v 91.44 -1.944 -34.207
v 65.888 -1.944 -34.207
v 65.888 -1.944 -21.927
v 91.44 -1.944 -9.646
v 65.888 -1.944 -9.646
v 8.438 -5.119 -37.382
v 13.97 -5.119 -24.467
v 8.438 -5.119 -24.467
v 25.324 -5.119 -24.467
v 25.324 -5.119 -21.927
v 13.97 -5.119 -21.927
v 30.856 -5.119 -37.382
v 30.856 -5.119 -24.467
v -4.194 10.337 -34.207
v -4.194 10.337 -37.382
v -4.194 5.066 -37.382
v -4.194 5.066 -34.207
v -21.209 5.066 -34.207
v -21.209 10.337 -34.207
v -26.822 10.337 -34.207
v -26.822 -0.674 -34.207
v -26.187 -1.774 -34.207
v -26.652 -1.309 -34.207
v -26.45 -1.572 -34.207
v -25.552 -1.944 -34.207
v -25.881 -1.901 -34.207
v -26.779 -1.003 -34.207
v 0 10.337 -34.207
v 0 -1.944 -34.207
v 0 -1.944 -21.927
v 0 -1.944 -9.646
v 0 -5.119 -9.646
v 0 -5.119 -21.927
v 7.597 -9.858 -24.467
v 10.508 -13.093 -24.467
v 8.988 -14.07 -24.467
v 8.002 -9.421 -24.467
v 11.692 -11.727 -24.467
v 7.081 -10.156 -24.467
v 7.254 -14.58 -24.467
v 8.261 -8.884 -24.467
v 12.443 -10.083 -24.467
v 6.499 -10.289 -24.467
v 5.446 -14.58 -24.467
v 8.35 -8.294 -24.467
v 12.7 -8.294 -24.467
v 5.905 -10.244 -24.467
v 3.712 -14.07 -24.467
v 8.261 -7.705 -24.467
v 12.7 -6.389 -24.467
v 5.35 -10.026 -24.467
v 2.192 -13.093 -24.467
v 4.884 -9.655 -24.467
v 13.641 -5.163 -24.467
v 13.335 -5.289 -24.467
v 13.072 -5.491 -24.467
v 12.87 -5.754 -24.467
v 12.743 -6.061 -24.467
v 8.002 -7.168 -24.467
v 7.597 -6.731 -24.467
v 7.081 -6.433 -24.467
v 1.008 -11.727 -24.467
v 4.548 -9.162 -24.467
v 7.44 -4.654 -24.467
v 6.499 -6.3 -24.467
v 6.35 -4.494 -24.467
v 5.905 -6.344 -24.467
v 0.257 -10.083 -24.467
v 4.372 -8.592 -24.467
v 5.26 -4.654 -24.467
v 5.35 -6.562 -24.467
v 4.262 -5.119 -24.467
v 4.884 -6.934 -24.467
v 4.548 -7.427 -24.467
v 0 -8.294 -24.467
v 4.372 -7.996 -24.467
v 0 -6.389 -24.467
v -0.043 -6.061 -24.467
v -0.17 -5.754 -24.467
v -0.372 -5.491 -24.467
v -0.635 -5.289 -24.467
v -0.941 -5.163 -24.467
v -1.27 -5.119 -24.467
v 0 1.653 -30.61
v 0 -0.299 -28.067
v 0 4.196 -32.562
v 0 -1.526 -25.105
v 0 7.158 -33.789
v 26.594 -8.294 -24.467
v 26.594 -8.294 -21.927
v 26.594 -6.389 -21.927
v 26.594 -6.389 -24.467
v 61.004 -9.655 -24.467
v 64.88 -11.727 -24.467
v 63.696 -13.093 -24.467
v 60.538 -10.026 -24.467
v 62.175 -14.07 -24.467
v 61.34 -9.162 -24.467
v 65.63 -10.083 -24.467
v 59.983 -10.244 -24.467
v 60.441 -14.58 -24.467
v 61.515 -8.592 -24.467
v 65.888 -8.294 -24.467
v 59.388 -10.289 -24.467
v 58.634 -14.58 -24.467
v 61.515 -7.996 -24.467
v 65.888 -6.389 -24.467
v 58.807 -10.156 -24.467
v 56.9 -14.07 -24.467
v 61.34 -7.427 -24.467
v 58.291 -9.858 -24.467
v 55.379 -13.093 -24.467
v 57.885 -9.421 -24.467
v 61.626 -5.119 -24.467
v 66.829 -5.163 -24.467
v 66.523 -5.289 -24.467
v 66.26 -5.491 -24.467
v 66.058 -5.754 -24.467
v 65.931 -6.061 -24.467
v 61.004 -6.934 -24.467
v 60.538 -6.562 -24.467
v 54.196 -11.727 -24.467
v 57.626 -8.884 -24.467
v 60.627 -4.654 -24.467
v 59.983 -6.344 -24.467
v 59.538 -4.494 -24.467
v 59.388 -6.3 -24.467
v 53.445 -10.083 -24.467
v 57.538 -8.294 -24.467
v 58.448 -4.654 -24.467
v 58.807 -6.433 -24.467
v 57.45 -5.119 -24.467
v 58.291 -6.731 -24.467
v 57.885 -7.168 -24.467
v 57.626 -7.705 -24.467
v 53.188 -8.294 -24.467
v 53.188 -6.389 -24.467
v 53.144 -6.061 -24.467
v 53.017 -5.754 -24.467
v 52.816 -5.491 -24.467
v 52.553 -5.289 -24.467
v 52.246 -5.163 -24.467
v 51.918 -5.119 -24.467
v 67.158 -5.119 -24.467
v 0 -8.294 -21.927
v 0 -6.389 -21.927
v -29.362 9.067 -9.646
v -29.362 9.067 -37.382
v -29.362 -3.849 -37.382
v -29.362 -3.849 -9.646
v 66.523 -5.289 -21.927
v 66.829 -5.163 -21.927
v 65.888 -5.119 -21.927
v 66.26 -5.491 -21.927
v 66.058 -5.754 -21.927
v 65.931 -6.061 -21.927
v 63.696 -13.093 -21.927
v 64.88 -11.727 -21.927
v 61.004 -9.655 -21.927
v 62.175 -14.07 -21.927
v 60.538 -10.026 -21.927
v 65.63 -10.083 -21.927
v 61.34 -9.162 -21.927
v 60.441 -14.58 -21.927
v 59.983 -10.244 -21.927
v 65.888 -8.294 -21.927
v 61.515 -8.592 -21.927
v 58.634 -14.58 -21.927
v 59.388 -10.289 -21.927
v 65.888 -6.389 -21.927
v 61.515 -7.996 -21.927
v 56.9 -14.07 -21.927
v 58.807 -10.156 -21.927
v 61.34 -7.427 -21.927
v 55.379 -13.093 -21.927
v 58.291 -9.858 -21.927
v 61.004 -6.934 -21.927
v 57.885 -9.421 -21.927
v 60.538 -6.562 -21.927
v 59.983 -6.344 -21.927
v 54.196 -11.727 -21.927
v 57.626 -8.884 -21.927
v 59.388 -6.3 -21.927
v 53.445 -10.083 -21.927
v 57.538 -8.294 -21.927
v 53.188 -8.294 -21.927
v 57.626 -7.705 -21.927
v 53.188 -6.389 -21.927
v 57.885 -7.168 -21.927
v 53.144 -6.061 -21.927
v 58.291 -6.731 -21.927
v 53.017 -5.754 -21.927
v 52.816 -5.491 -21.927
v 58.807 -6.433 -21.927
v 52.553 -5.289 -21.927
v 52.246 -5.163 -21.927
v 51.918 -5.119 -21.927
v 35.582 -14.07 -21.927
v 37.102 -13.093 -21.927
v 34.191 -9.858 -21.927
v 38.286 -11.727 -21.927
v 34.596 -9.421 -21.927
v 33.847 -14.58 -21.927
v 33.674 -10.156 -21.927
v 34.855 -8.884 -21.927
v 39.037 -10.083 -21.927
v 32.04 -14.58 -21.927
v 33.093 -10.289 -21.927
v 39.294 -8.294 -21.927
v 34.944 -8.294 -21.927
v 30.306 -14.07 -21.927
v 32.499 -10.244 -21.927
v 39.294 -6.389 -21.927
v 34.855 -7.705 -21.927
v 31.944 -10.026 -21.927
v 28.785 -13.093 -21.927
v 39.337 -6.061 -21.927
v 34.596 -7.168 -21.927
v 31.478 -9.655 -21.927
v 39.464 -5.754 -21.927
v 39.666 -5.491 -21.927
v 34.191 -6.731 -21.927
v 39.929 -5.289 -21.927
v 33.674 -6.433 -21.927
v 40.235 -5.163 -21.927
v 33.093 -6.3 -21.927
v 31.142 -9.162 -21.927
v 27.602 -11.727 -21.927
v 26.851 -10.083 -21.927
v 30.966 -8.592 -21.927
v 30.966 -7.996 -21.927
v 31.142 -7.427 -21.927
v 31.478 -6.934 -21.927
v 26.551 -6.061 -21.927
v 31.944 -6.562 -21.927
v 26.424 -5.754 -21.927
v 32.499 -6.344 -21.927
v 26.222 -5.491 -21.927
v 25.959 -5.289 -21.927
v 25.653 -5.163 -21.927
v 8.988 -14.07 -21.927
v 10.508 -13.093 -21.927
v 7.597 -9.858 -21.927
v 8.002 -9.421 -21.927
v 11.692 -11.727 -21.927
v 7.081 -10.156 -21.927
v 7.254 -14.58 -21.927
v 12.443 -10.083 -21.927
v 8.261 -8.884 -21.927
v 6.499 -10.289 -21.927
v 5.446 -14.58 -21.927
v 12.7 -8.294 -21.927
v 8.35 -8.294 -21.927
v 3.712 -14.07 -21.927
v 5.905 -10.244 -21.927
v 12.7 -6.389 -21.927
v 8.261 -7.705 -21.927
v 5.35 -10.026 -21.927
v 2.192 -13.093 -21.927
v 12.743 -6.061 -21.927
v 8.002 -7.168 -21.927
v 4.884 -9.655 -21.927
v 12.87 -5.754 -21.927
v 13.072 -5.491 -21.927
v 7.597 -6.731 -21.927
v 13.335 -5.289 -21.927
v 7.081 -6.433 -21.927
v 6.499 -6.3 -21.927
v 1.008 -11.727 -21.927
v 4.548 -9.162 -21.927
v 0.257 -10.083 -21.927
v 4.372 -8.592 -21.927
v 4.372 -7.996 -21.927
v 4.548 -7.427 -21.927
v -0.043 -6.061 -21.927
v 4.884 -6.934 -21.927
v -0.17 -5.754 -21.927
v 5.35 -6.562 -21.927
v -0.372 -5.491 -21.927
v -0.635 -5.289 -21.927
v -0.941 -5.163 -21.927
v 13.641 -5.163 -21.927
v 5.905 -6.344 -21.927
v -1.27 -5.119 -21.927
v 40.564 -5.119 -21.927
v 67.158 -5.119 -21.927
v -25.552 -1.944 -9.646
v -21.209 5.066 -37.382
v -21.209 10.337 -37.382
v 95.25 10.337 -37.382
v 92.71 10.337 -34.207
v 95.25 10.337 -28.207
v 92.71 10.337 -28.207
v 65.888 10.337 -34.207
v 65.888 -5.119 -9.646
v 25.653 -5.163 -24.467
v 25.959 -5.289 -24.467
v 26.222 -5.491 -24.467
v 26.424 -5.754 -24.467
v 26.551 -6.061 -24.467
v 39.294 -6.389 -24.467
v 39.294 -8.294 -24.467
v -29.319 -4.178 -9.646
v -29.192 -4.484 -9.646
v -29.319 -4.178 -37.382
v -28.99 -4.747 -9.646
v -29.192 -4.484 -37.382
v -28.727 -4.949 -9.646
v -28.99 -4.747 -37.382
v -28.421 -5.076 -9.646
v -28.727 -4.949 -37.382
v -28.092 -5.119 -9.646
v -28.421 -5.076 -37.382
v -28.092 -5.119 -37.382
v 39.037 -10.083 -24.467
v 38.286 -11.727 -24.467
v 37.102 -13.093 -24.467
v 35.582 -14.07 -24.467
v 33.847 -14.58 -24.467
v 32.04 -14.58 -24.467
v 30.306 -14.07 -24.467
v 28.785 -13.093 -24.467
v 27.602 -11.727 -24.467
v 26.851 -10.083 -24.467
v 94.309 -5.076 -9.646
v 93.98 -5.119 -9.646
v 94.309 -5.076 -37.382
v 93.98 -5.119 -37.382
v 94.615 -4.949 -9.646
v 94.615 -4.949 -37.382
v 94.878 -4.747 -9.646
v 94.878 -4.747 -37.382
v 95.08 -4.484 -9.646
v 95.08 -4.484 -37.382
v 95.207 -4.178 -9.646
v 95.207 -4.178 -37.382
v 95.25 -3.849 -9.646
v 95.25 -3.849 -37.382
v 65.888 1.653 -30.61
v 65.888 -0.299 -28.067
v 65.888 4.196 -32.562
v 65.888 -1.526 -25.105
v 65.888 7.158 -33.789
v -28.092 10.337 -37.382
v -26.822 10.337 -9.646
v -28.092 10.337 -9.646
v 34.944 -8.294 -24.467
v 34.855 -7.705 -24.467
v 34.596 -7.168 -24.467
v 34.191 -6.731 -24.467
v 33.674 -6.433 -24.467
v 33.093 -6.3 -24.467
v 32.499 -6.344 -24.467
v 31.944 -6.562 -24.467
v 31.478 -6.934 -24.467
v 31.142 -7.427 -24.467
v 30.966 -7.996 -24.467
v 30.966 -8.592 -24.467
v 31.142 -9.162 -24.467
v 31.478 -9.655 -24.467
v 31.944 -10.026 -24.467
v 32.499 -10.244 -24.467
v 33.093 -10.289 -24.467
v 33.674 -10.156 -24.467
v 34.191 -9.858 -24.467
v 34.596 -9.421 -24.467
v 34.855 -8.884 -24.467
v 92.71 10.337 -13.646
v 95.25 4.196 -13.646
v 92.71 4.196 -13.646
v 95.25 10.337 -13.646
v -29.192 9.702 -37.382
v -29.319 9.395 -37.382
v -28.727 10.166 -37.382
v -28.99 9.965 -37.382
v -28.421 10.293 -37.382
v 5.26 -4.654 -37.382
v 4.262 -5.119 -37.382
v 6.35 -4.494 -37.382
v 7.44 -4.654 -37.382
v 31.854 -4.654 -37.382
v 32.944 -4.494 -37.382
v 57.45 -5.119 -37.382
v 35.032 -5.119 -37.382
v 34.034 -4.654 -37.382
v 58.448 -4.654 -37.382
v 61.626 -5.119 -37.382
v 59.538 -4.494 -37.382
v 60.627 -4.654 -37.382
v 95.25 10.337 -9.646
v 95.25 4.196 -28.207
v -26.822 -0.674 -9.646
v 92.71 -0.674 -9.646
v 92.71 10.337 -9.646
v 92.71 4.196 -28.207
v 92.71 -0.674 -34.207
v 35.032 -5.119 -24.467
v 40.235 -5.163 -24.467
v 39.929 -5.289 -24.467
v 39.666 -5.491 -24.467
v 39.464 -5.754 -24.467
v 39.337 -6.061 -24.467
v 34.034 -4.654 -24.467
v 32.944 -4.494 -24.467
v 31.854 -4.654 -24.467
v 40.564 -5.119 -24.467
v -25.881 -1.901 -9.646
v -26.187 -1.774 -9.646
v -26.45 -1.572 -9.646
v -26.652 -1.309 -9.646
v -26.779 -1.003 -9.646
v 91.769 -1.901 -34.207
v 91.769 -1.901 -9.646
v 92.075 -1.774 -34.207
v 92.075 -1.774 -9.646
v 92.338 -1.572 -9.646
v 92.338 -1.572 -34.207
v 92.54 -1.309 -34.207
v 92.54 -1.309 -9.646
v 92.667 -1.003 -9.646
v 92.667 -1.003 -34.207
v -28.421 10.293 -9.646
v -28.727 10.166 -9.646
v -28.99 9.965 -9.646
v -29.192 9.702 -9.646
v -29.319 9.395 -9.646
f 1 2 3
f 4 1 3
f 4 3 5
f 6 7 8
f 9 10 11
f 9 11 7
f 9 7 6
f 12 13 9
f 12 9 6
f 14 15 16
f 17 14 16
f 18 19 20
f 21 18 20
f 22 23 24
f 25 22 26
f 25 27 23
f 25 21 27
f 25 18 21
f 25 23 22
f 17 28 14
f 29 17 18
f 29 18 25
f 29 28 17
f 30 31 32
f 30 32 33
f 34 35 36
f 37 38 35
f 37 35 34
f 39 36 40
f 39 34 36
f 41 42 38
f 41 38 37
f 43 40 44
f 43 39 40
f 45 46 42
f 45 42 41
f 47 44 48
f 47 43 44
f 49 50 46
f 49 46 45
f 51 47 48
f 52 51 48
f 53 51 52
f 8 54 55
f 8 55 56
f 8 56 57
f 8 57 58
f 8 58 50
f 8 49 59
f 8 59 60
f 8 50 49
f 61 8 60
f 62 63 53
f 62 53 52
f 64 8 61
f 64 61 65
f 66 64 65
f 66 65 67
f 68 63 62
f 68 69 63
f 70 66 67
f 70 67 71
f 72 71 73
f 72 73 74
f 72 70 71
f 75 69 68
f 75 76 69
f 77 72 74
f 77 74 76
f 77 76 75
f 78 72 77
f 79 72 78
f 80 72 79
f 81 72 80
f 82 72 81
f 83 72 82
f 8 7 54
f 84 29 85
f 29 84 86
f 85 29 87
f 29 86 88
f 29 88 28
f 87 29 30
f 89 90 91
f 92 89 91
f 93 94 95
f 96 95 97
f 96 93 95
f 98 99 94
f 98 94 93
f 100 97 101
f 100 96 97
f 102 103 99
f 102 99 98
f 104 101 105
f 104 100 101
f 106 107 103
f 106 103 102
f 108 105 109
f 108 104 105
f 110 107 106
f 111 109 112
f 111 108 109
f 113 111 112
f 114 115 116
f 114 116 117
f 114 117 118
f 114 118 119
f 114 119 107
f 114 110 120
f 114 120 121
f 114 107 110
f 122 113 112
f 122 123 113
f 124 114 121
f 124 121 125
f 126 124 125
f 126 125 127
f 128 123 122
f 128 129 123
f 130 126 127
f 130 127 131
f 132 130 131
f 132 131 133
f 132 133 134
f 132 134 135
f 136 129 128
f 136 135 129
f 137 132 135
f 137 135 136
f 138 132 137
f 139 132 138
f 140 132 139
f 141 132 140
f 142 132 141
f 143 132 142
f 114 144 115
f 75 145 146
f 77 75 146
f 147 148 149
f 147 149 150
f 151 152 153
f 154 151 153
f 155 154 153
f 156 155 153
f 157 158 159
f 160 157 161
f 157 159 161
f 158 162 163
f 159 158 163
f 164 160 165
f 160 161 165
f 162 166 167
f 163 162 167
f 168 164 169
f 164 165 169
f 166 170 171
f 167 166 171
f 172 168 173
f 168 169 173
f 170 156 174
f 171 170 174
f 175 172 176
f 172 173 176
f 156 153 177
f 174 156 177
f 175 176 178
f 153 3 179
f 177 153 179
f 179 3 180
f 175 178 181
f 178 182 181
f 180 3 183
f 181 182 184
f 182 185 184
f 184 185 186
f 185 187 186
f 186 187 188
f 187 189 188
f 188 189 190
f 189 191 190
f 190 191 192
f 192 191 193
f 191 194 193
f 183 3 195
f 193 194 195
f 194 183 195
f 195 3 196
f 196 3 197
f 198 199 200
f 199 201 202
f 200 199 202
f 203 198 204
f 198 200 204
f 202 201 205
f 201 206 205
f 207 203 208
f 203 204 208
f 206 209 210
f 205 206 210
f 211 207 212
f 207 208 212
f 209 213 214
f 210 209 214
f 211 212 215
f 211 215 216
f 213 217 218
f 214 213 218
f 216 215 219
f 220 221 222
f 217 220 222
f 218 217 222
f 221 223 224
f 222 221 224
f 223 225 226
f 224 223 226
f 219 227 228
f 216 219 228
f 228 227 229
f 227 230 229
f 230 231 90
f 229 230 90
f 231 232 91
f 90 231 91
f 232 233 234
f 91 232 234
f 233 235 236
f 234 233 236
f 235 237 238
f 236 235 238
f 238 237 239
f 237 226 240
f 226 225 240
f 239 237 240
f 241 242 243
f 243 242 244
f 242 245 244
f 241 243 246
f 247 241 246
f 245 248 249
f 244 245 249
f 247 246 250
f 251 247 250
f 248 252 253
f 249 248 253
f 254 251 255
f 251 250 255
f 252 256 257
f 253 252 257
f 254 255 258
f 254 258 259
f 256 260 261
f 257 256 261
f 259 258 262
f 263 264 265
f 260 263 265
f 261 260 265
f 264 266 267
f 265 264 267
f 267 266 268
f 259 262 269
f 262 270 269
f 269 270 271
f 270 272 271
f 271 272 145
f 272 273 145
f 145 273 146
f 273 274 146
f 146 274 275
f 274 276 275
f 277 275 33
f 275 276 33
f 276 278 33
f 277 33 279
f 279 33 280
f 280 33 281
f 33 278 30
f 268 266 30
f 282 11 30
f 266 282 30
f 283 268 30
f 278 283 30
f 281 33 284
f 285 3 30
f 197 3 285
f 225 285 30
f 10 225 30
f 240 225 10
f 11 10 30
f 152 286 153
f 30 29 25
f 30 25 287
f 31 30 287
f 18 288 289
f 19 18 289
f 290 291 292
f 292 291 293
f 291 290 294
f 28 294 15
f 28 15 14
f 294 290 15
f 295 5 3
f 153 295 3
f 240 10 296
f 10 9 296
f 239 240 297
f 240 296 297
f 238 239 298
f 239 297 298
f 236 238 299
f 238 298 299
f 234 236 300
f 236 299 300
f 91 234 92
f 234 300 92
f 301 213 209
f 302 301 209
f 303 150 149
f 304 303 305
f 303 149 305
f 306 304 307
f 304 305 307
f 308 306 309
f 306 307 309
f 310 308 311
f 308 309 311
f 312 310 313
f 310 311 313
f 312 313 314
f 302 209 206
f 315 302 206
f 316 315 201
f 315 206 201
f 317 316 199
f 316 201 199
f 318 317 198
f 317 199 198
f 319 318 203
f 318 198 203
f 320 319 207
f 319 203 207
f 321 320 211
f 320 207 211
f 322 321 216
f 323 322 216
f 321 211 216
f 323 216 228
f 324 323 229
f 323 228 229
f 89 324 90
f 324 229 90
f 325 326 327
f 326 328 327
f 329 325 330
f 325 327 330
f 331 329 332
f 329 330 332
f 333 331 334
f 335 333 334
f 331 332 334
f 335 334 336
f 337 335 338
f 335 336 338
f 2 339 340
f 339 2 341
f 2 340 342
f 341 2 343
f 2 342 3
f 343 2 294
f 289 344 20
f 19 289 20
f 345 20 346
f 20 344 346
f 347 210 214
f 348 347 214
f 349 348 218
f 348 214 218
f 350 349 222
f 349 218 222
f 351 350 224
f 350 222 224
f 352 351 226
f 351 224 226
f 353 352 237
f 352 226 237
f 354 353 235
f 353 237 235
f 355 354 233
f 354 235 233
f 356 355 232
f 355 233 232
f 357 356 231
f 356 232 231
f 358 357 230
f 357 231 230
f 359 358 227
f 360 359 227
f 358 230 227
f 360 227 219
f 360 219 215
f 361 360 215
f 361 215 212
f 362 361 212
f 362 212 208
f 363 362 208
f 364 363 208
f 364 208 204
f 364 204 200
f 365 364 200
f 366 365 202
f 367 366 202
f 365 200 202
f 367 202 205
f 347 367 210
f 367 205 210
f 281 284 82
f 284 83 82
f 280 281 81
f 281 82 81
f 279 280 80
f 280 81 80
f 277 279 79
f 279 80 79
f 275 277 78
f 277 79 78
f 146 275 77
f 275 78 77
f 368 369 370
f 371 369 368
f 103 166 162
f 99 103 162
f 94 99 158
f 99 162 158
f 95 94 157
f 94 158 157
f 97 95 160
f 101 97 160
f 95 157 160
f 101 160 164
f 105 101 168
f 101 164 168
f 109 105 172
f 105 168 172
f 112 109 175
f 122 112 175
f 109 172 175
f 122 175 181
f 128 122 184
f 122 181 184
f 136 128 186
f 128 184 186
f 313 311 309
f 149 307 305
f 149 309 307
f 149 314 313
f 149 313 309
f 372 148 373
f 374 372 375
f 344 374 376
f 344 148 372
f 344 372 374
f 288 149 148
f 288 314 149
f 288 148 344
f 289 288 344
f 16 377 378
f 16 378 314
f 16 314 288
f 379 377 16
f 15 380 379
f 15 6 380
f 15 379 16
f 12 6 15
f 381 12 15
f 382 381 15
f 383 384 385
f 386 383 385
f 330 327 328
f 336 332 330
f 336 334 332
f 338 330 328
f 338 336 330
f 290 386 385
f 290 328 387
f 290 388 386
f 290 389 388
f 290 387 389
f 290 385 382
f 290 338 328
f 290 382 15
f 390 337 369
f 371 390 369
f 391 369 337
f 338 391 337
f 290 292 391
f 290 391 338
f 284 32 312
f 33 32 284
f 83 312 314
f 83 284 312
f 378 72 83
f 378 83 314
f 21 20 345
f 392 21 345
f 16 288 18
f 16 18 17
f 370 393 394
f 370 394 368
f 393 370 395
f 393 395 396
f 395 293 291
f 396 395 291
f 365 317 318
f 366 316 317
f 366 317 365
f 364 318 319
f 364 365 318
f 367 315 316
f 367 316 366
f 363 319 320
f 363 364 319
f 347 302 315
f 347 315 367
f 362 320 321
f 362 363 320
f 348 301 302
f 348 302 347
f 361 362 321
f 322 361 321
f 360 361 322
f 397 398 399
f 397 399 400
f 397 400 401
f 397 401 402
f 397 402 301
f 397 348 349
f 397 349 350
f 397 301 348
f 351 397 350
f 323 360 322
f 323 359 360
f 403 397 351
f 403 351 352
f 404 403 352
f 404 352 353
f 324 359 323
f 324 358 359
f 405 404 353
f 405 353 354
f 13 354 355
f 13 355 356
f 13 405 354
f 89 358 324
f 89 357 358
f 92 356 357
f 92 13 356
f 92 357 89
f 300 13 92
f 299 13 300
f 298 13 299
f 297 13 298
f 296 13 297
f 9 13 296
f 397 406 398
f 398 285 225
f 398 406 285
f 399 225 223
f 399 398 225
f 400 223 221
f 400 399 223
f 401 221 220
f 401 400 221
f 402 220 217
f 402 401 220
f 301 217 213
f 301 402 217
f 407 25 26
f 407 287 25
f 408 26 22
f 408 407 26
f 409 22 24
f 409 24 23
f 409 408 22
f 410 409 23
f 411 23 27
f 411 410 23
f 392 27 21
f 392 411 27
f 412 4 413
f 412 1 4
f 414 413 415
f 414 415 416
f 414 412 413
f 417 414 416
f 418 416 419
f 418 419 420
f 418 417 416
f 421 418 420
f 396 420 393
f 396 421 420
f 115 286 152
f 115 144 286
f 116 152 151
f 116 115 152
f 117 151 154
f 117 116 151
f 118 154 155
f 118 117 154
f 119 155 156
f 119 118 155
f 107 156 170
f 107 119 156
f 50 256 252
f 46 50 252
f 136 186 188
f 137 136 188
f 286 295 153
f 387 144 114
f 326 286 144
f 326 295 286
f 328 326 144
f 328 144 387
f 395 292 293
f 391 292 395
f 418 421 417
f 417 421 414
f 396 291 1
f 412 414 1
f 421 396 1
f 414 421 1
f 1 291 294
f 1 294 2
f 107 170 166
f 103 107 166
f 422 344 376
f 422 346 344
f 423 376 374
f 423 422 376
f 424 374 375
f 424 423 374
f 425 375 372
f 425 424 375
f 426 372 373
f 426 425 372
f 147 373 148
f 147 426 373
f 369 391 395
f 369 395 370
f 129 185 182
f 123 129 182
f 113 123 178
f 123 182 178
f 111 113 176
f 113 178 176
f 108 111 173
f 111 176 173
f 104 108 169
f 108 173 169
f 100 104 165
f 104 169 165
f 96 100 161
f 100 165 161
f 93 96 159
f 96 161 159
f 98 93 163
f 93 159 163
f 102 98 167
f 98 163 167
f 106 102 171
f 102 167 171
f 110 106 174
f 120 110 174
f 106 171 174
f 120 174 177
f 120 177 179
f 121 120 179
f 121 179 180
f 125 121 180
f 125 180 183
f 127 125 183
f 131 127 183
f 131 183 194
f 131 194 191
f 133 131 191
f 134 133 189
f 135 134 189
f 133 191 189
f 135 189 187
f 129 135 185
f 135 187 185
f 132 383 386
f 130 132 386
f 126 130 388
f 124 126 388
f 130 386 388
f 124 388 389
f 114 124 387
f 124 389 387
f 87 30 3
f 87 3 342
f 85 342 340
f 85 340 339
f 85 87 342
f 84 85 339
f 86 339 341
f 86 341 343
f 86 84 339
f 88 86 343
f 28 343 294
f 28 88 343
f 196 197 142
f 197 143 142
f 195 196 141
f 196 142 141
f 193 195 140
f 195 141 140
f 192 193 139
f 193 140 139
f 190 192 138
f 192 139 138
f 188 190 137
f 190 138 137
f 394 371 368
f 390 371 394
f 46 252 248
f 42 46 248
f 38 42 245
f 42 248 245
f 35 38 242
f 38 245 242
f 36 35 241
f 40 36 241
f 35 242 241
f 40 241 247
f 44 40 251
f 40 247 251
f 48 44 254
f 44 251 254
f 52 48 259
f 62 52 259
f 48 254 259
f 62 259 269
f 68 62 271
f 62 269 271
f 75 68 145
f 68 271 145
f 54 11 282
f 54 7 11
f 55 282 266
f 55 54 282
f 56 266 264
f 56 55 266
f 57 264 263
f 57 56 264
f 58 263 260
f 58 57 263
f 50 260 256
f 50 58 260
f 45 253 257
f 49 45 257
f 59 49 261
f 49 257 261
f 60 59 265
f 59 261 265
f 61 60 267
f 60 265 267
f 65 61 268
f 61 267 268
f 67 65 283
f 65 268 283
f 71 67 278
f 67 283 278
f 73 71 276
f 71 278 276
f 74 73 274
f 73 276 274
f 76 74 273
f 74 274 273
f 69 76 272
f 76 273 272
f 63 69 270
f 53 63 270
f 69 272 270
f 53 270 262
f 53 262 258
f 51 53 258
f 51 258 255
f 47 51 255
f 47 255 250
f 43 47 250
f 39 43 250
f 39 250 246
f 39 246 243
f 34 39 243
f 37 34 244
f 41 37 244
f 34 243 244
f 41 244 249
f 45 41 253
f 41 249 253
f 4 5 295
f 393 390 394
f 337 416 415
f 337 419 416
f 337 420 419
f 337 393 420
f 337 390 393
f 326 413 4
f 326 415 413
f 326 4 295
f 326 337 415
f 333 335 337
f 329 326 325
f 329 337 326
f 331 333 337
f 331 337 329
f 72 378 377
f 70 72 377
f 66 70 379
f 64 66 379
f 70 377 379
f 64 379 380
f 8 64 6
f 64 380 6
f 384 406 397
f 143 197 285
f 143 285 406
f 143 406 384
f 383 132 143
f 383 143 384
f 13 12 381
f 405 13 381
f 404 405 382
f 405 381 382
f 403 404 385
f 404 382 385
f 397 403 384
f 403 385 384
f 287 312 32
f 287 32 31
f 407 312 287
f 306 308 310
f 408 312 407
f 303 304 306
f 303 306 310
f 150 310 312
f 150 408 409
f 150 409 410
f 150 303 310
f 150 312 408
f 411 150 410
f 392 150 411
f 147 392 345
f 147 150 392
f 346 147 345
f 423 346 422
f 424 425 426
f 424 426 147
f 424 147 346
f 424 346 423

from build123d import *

# Parameters (mm, degrees)
BOSS_EXTRUDE1_DEPTH = 65.8876
BOSS_EXTRUDE2_DEPTH = 29.3624
BOSS_EXTRUDE3_DEPTH = 2.54
SKETCH4_R           = 2
BOSS_EXTRUDE4_DEPTH = 2.54
SKETCH6_W           = 24.561
SKETCH6_H           = 12.2809
BOSS_EXTRUDE5_DEPTH = 2.54
CUT_EXTRUDE1_DEPTH  = 101.281127945
FILLET1_R           = 1.27
FILLET2_R           = 1.27
FILLET4_R           = 1.27
SKETCH8_R           = 3.8
SKETCH8_R_2         = 3.80000002
CUT_EXTRUDE2_DEPTH  = 12.9159


with BuildPart() as part:
    # Sketch1 → Boss-Extrude1 (new body)
    with BuildSketch(Plane(origin=(0, 0, 0), x_dir=(0, 0, -1), z_dir=(1, 0, 0))):
        with BuildLine():
            Line((34.207401555, 10.336569156), (37.382401555, 10.336569156))
            Line((37.382401555, 10.336569156), (37.382401555, -5.119330844))
            Line((37.382401555, -5.119330844), (21.926501555, -5.119330844))
            Line((21.926501555, -5.119330844), (21.926501555, -1.944330844))
            ThreePointArc((21.926501555, -1.944330844), (30.610409224, 1.652661487), (34.207401555, 10.336569156))
        make_face()
    extrude(amount=BOSS_EXTRUDE1_DEPTH)

    # Sketch2 → Boss-Extrude2 (add)
    with BuildSketch(Plane(origin=(65.8876, 0, 0), x_dir=(0, 0, -1), z_dir=(1, 0, 0))):
        Polygon((37.382401555, -1.944330844), (37.382401555, 10.336569156), (34.207401555, 10.336569156), (34.207401555, -1.944330844), (9.646401555, -1.944330844), (9.646401555, -5.119330844), (37.382401555, -5.119330844), align=None)
    boss_extrude2 = extrude(amount=BOSS_EXTRUDE2_DEPTH)

    # Sketch3 → Boss-Extrude3 (add)
    with BuildSketch(Plane(origin=(95.25, 0, 0), x_dir=(0, 0, -1), z_dir=(1, 0, 0))):
        Polygon((28.207401555, 4.196119156), (13.646401555, 4.196119156), (13.646401555, 10.336569156), (9.646401555, 10.336569156), (9.646401555, 4.196119156), (9.646401555, -1.944330844), (28.207401555, -1.944330844), (34.207401555, -1.944330844), (34.207401555, 10.336569156), (28.207401555, 10.336569156), align=None)
    extrude(amount=-BOSS_EXTRUDE3_DEPTH)

    # Sketch4 → Boss-Extrude4 (add)
    # profile 1 of 3: a face of its own
    with BuildSketch(Plane.XY.offset(-21.926501555)):
        with BuildLine():
            Line((0, -8.294330844), (0, -5.119330844))
            Line((0, -5.119330844), (12.7, -5.119330844))
            Line((12.7, -5.119330844), (12.7, -8.294330844))
            ThreePointArc((12.7, -8.294330844), (6.35, -14.644330844), (0, -8.294330844))
        make_face()
        with Locations((6.35, -8.294330844)):
            Circle(SKETCH4_R, mode=Mode.SUBTRACT)
    # profile 2 of 3: a face of its own
    with BuildSketch(Plane.XY.offset(-21.926501555)):
        with BuildLine():
            Line((26.5938, -8.294330844), (26.5938, -5.119330844))
            Line((26.5938, -5.119330844), (39.2938, -5.119330844))
            Line((39.2938, -5.119330844), (39.2938, -8.294330844))
            ThreePointArc((39.2938, -8.294330844), (32.9438, -14.644330844), (26.5938, -8.294330844))
        make_face()
        with Locations((32.9438, -8.294330844)):
            Circle(SKETCH4_R, mode=Mode.SUBTRACT)
    # profile 3 of 3: a face of its own
    with BuildSketch(Plane.XY.offset(-21.926501555)):
        with BuildLine():
            Line((53.1876, -5.119330844), (65.8876, -5.119330844))
            Line((65.8876, -5.119330844), (65.8876, -8.294330844))
            ThreePointArc((65.8876, -8.294330844), (59.5376, -14.644330844), (53.1876, -8.294330844))
            Line((53.1876, -8.294330844), (53.1876, -5.119330844))
        make_face()
        with Locations(Location((59.5376, -8.294330844, 0), (0, 0, 180))):
            Circle(SKETCH4_R, mode=Mode.SUBTRACT)
    extrude(amount=-BOSS_EXTRUDE4_DEPTH)

    # Mirror1: Boss-Extrude2 across plane
    add(boss_extrude2.mirror(Plane(origin=(32.9438, 0, 0), x_dir=(0, 0, 1), z_dir=(1, 0, 0))))

    # Sketch6 → Boss-Extrude5 (add)
    with BuildSketch(Plane.ZY.offset(29.3624)):
        with Locations((-21.926901555, 4.196119156)):
            Rectangle(SKETCH6_W, SKETCH6_H)
    extrude(amount=-BOSS_EXTRUDE5_DEPTH)

    # Sketch7 → Cut-Extrude1 (cut, through all)
    with BuildSketch(Plane(origin=(0, 0, -37.382401555), x_dir=(-1, 0, 0), z_dir=(0, 0, -1))):
        Polygon((4.19354, 9.257069156), (4.19354, 10.336569156), (21.209, 10.336569156), (21.209, 9.257069156), (21.209, 5.066069156), (4.19354, 5.066069156), align=None)
    extrude(amount=-CUT_EXTRUDE1_DEPTH, mode=Mode.SUBTRACT)

    # Fillet1
    fillet1_edges = [part.edges().sort_by_distance(p)[0] for p in [
        (-29.3624, -5.119330844, -23.514401555),
        (-29.3624, 10.336569156, -23.514401555),
        (95.25, -5.119330844, -23.514401555),
    ]]
    fillet(fillet1_edges, radius=FILLET1_R)

    # Fillet2
    fillet2_edges = [part.edges().sort_by_distance(p)[0] for p in [
        (0, -5.119330844, -23.196501555),
        (12.7, -5.119330844, -23.196501555),
        (26.5938, -5.119330844, -23.196501555),
        (39.2938, -5.119330844, -23.196501555),
        (65.8876, -5.119330844, -23.196501555),
        (53.1876, -5.119330844, -23.196501555),
    ]]
    fillet(fillet2_edges, radius=FILLET2_R)

    # Fillet4
    fillet4_edges = [part.edges().sort_by_distance(p)[0] for p in [
        (-26.8224, -1.944330844, -21.926901555),
        (92.71, -1.944330844, -21.926901555),
    ]]
    fillet(fillet4_edges, radius=FILLET4_R)

    # Sketch8 → Cut-Extrude2 (cut)
    with BuildSketch(Plane(origin=(0, 0, -37.382401555), x_dir=(-1, 0, 0), z_dir=(0, 0, -1))):
        with Locations((-59.5376, -8.294330844)):
            Circle(SKETCH8_R)
        with Locations((-32.9438, -8.294330844)):
            Circle(SKETCH8_R_2)
        with Locations((-6.35, -8.294330844)):
            Circle(SKETCH8_R_2)
    extrude(amount=-CUT_EXTRUDE2_DEPTH, mode=Mode.SUBTRACT)


solid = part.part
